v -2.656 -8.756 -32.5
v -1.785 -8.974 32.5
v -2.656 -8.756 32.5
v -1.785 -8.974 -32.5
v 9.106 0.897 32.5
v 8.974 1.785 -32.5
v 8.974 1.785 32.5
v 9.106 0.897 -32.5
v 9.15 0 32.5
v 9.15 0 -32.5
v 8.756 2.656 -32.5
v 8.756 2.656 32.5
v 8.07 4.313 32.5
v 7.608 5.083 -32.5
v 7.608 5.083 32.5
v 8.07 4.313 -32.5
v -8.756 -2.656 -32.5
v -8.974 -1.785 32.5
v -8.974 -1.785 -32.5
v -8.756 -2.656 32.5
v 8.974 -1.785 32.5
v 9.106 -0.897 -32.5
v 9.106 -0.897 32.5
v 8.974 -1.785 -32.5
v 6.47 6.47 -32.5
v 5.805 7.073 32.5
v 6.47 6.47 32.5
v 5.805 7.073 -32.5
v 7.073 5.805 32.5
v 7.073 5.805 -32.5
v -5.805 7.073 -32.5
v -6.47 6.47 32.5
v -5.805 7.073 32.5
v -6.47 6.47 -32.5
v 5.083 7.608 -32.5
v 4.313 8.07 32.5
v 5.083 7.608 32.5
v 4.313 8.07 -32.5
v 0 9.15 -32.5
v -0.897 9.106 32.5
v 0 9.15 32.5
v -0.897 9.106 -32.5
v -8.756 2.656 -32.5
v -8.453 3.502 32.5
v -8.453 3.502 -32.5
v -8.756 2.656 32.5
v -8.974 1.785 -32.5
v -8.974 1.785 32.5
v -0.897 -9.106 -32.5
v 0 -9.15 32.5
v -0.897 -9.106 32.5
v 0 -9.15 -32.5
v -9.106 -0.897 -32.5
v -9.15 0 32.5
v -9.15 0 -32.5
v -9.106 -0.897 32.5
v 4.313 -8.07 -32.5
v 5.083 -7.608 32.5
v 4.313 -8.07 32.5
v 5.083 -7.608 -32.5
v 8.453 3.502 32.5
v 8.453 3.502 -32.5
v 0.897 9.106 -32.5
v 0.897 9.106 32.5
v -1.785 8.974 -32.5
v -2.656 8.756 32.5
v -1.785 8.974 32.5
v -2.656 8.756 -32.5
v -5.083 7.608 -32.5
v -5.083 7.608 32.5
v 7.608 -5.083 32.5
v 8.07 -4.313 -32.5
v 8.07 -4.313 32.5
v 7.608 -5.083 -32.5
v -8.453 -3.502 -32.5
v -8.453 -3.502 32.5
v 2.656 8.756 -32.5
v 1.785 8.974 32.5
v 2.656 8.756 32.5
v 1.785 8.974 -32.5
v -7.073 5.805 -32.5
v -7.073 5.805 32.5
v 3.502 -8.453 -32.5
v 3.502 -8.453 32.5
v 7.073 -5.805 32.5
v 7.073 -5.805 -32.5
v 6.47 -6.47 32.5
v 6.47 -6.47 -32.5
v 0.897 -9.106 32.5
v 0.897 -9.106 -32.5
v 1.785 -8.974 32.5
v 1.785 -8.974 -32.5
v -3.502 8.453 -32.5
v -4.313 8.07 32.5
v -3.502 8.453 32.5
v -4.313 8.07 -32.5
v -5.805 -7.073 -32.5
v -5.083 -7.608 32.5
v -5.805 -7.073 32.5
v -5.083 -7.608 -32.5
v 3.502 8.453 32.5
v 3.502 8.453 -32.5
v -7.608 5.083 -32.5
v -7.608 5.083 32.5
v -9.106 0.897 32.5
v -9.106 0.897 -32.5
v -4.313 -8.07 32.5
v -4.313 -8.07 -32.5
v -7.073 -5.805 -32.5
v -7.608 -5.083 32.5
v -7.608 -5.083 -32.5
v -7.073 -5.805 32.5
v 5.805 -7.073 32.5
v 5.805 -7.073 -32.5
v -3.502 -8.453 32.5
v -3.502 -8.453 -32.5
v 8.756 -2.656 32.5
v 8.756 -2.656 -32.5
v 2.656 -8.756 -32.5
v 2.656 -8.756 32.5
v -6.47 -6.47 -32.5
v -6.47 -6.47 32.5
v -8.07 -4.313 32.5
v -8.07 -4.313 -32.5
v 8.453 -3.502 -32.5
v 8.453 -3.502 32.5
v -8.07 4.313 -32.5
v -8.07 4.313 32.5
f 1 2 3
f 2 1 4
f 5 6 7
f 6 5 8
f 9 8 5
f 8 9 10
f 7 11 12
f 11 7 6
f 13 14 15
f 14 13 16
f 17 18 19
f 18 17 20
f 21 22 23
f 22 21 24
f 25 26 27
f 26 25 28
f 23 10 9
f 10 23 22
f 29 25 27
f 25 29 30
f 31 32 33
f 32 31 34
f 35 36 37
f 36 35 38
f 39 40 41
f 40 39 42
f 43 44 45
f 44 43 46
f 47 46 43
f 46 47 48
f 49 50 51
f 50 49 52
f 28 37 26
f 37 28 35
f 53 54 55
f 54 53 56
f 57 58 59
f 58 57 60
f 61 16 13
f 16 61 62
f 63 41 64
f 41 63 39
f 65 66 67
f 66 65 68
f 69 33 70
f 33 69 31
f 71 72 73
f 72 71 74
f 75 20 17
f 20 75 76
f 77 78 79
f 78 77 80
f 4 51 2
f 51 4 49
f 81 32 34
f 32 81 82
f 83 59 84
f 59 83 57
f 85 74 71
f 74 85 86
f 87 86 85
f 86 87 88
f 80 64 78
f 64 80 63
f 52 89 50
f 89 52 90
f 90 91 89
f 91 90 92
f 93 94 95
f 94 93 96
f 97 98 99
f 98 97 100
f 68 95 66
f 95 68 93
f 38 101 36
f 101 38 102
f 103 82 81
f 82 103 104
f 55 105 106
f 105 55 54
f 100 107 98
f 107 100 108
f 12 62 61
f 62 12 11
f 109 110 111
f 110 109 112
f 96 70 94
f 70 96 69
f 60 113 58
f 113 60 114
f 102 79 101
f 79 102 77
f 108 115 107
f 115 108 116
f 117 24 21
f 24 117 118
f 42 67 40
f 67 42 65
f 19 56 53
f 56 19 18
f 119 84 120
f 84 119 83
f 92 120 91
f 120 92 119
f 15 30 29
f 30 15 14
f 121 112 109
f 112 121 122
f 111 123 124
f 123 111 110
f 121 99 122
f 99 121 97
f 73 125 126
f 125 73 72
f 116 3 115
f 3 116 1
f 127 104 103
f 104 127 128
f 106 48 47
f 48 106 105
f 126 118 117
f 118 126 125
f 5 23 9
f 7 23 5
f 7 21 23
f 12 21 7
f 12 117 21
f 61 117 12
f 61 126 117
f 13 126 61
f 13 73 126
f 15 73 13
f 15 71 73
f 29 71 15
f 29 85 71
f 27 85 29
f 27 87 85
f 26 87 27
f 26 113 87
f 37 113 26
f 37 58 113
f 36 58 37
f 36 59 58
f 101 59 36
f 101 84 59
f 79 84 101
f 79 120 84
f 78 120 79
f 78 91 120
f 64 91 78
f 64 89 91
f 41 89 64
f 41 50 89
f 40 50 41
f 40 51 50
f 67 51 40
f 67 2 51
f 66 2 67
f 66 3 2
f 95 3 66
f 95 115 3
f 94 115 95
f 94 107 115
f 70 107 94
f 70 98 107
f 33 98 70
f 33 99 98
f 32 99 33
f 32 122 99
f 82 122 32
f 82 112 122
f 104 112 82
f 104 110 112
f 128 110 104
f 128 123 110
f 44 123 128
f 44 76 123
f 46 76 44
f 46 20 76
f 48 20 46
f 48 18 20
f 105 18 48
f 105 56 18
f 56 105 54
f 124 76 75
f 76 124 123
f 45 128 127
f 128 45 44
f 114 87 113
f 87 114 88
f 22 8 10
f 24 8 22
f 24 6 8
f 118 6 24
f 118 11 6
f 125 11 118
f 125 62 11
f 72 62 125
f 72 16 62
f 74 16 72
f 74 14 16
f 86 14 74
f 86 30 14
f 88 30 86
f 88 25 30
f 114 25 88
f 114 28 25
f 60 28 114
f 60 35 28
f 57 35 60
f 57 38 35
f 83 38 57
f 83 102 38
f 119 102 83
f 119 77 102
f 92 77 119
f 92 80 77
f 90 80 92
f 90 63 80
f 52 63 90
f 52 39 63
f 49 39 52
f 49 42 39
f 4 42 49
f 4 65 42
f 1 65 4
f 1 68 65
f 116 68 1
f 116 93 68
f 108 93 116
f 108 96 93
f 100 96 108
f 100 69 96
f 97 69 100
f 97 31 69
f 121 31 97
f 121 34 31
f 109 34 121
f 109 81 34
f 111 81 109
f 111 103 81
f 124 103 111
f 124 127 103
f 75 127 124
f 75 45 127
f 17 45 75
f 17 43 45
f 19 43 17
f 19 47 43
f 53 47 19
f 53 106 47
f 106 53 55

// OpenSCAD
// Parameters
height_mm = 65; //[32.5:130:0.1]
diameter_mm = 18.3; //[9.15:36.6:0.1]
positive_terminal_diameter_mm = 5.5; //[2.75:11:0.1]
positive_terminal_height_mm = 1.5; //[0.75:3:0.1]
edge_chamfer_mm = 0.3; //[0.15:0.6:0.05]
overlap_mm = 0.8; //[0.5:2:0.1]

// Battery - complete geometry
module battery() {
  color("DimGray") {
    // Main cylindrical body
    cylinder(h=height_mm, r=diameter_mm/2, center=true, $fn=64);
    
    // Positive terminal button
    translate([0, 0, height_mm/2 - overlap_mm])
      cylinder(h=positive_terminal_height_mm, r=positive_terminal_diameter_mm/2, center=true, $fn=32);
    
    // Negative terminal flat end
    translate([0, 0, -height_mm/2 + edge_chamfer_mm/2])
      cylinder(h=edge_chamfer_mm, r=diameter_mm/2, center=true, $fn=64);
    
    // Negative edge chamfer cut
    difference() {
      cylinder(h=height_mm, r=diameter_mm/2, center=true, $fn=64);
      translate([0, 0, -height_mm/2 + edge_chamfer_mm/2])
        cylinder(h=edge_chamfer_mm, r1=diameter_mm/2, r2=0, center=true, $fn=64);
    }
  }
}

// Assembly
module assembly() {
  battery();
}

assembly();
